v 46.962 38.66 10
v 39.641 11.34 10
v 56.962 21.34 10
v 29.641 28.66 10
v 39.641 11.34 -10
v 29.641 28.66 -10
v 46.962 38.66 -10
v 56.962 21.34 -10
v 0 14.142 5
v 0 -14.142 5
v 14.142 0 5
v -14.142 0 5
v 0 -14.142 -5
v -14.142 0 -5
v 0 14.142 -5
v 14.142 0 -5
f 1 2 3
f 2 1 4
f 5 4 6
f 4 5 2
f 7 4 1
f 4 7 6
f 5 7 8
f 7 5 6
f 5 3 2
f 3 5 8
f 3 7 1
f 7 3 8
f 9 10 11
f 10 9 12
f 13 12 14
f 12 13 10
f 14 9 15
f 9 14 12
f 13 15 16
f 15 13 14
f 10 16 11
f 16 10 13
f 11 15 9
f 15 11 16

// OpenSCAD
//----------------------------------------------------------
//-- Tutorial OpenScad
//-- Juan Gonzalez-Gomez (Obijuan) juan@iearobotics.com
//----------------------------------------------------------
//-- (c) Mayo, 2012
//-- Licencia GPL
//----------------------------------------------------------
//-- Ejemplo de translación y rotación
//----------------------------------------------------------

//-- Traslación y rotación de un cubo
rotate([0,0,30])
  translate([50,0,0])
    cube([20,20,20],center=true);

//-- rotación de un cubo
rotate([0,0,45])
  cube([20,20,10],center=true);
